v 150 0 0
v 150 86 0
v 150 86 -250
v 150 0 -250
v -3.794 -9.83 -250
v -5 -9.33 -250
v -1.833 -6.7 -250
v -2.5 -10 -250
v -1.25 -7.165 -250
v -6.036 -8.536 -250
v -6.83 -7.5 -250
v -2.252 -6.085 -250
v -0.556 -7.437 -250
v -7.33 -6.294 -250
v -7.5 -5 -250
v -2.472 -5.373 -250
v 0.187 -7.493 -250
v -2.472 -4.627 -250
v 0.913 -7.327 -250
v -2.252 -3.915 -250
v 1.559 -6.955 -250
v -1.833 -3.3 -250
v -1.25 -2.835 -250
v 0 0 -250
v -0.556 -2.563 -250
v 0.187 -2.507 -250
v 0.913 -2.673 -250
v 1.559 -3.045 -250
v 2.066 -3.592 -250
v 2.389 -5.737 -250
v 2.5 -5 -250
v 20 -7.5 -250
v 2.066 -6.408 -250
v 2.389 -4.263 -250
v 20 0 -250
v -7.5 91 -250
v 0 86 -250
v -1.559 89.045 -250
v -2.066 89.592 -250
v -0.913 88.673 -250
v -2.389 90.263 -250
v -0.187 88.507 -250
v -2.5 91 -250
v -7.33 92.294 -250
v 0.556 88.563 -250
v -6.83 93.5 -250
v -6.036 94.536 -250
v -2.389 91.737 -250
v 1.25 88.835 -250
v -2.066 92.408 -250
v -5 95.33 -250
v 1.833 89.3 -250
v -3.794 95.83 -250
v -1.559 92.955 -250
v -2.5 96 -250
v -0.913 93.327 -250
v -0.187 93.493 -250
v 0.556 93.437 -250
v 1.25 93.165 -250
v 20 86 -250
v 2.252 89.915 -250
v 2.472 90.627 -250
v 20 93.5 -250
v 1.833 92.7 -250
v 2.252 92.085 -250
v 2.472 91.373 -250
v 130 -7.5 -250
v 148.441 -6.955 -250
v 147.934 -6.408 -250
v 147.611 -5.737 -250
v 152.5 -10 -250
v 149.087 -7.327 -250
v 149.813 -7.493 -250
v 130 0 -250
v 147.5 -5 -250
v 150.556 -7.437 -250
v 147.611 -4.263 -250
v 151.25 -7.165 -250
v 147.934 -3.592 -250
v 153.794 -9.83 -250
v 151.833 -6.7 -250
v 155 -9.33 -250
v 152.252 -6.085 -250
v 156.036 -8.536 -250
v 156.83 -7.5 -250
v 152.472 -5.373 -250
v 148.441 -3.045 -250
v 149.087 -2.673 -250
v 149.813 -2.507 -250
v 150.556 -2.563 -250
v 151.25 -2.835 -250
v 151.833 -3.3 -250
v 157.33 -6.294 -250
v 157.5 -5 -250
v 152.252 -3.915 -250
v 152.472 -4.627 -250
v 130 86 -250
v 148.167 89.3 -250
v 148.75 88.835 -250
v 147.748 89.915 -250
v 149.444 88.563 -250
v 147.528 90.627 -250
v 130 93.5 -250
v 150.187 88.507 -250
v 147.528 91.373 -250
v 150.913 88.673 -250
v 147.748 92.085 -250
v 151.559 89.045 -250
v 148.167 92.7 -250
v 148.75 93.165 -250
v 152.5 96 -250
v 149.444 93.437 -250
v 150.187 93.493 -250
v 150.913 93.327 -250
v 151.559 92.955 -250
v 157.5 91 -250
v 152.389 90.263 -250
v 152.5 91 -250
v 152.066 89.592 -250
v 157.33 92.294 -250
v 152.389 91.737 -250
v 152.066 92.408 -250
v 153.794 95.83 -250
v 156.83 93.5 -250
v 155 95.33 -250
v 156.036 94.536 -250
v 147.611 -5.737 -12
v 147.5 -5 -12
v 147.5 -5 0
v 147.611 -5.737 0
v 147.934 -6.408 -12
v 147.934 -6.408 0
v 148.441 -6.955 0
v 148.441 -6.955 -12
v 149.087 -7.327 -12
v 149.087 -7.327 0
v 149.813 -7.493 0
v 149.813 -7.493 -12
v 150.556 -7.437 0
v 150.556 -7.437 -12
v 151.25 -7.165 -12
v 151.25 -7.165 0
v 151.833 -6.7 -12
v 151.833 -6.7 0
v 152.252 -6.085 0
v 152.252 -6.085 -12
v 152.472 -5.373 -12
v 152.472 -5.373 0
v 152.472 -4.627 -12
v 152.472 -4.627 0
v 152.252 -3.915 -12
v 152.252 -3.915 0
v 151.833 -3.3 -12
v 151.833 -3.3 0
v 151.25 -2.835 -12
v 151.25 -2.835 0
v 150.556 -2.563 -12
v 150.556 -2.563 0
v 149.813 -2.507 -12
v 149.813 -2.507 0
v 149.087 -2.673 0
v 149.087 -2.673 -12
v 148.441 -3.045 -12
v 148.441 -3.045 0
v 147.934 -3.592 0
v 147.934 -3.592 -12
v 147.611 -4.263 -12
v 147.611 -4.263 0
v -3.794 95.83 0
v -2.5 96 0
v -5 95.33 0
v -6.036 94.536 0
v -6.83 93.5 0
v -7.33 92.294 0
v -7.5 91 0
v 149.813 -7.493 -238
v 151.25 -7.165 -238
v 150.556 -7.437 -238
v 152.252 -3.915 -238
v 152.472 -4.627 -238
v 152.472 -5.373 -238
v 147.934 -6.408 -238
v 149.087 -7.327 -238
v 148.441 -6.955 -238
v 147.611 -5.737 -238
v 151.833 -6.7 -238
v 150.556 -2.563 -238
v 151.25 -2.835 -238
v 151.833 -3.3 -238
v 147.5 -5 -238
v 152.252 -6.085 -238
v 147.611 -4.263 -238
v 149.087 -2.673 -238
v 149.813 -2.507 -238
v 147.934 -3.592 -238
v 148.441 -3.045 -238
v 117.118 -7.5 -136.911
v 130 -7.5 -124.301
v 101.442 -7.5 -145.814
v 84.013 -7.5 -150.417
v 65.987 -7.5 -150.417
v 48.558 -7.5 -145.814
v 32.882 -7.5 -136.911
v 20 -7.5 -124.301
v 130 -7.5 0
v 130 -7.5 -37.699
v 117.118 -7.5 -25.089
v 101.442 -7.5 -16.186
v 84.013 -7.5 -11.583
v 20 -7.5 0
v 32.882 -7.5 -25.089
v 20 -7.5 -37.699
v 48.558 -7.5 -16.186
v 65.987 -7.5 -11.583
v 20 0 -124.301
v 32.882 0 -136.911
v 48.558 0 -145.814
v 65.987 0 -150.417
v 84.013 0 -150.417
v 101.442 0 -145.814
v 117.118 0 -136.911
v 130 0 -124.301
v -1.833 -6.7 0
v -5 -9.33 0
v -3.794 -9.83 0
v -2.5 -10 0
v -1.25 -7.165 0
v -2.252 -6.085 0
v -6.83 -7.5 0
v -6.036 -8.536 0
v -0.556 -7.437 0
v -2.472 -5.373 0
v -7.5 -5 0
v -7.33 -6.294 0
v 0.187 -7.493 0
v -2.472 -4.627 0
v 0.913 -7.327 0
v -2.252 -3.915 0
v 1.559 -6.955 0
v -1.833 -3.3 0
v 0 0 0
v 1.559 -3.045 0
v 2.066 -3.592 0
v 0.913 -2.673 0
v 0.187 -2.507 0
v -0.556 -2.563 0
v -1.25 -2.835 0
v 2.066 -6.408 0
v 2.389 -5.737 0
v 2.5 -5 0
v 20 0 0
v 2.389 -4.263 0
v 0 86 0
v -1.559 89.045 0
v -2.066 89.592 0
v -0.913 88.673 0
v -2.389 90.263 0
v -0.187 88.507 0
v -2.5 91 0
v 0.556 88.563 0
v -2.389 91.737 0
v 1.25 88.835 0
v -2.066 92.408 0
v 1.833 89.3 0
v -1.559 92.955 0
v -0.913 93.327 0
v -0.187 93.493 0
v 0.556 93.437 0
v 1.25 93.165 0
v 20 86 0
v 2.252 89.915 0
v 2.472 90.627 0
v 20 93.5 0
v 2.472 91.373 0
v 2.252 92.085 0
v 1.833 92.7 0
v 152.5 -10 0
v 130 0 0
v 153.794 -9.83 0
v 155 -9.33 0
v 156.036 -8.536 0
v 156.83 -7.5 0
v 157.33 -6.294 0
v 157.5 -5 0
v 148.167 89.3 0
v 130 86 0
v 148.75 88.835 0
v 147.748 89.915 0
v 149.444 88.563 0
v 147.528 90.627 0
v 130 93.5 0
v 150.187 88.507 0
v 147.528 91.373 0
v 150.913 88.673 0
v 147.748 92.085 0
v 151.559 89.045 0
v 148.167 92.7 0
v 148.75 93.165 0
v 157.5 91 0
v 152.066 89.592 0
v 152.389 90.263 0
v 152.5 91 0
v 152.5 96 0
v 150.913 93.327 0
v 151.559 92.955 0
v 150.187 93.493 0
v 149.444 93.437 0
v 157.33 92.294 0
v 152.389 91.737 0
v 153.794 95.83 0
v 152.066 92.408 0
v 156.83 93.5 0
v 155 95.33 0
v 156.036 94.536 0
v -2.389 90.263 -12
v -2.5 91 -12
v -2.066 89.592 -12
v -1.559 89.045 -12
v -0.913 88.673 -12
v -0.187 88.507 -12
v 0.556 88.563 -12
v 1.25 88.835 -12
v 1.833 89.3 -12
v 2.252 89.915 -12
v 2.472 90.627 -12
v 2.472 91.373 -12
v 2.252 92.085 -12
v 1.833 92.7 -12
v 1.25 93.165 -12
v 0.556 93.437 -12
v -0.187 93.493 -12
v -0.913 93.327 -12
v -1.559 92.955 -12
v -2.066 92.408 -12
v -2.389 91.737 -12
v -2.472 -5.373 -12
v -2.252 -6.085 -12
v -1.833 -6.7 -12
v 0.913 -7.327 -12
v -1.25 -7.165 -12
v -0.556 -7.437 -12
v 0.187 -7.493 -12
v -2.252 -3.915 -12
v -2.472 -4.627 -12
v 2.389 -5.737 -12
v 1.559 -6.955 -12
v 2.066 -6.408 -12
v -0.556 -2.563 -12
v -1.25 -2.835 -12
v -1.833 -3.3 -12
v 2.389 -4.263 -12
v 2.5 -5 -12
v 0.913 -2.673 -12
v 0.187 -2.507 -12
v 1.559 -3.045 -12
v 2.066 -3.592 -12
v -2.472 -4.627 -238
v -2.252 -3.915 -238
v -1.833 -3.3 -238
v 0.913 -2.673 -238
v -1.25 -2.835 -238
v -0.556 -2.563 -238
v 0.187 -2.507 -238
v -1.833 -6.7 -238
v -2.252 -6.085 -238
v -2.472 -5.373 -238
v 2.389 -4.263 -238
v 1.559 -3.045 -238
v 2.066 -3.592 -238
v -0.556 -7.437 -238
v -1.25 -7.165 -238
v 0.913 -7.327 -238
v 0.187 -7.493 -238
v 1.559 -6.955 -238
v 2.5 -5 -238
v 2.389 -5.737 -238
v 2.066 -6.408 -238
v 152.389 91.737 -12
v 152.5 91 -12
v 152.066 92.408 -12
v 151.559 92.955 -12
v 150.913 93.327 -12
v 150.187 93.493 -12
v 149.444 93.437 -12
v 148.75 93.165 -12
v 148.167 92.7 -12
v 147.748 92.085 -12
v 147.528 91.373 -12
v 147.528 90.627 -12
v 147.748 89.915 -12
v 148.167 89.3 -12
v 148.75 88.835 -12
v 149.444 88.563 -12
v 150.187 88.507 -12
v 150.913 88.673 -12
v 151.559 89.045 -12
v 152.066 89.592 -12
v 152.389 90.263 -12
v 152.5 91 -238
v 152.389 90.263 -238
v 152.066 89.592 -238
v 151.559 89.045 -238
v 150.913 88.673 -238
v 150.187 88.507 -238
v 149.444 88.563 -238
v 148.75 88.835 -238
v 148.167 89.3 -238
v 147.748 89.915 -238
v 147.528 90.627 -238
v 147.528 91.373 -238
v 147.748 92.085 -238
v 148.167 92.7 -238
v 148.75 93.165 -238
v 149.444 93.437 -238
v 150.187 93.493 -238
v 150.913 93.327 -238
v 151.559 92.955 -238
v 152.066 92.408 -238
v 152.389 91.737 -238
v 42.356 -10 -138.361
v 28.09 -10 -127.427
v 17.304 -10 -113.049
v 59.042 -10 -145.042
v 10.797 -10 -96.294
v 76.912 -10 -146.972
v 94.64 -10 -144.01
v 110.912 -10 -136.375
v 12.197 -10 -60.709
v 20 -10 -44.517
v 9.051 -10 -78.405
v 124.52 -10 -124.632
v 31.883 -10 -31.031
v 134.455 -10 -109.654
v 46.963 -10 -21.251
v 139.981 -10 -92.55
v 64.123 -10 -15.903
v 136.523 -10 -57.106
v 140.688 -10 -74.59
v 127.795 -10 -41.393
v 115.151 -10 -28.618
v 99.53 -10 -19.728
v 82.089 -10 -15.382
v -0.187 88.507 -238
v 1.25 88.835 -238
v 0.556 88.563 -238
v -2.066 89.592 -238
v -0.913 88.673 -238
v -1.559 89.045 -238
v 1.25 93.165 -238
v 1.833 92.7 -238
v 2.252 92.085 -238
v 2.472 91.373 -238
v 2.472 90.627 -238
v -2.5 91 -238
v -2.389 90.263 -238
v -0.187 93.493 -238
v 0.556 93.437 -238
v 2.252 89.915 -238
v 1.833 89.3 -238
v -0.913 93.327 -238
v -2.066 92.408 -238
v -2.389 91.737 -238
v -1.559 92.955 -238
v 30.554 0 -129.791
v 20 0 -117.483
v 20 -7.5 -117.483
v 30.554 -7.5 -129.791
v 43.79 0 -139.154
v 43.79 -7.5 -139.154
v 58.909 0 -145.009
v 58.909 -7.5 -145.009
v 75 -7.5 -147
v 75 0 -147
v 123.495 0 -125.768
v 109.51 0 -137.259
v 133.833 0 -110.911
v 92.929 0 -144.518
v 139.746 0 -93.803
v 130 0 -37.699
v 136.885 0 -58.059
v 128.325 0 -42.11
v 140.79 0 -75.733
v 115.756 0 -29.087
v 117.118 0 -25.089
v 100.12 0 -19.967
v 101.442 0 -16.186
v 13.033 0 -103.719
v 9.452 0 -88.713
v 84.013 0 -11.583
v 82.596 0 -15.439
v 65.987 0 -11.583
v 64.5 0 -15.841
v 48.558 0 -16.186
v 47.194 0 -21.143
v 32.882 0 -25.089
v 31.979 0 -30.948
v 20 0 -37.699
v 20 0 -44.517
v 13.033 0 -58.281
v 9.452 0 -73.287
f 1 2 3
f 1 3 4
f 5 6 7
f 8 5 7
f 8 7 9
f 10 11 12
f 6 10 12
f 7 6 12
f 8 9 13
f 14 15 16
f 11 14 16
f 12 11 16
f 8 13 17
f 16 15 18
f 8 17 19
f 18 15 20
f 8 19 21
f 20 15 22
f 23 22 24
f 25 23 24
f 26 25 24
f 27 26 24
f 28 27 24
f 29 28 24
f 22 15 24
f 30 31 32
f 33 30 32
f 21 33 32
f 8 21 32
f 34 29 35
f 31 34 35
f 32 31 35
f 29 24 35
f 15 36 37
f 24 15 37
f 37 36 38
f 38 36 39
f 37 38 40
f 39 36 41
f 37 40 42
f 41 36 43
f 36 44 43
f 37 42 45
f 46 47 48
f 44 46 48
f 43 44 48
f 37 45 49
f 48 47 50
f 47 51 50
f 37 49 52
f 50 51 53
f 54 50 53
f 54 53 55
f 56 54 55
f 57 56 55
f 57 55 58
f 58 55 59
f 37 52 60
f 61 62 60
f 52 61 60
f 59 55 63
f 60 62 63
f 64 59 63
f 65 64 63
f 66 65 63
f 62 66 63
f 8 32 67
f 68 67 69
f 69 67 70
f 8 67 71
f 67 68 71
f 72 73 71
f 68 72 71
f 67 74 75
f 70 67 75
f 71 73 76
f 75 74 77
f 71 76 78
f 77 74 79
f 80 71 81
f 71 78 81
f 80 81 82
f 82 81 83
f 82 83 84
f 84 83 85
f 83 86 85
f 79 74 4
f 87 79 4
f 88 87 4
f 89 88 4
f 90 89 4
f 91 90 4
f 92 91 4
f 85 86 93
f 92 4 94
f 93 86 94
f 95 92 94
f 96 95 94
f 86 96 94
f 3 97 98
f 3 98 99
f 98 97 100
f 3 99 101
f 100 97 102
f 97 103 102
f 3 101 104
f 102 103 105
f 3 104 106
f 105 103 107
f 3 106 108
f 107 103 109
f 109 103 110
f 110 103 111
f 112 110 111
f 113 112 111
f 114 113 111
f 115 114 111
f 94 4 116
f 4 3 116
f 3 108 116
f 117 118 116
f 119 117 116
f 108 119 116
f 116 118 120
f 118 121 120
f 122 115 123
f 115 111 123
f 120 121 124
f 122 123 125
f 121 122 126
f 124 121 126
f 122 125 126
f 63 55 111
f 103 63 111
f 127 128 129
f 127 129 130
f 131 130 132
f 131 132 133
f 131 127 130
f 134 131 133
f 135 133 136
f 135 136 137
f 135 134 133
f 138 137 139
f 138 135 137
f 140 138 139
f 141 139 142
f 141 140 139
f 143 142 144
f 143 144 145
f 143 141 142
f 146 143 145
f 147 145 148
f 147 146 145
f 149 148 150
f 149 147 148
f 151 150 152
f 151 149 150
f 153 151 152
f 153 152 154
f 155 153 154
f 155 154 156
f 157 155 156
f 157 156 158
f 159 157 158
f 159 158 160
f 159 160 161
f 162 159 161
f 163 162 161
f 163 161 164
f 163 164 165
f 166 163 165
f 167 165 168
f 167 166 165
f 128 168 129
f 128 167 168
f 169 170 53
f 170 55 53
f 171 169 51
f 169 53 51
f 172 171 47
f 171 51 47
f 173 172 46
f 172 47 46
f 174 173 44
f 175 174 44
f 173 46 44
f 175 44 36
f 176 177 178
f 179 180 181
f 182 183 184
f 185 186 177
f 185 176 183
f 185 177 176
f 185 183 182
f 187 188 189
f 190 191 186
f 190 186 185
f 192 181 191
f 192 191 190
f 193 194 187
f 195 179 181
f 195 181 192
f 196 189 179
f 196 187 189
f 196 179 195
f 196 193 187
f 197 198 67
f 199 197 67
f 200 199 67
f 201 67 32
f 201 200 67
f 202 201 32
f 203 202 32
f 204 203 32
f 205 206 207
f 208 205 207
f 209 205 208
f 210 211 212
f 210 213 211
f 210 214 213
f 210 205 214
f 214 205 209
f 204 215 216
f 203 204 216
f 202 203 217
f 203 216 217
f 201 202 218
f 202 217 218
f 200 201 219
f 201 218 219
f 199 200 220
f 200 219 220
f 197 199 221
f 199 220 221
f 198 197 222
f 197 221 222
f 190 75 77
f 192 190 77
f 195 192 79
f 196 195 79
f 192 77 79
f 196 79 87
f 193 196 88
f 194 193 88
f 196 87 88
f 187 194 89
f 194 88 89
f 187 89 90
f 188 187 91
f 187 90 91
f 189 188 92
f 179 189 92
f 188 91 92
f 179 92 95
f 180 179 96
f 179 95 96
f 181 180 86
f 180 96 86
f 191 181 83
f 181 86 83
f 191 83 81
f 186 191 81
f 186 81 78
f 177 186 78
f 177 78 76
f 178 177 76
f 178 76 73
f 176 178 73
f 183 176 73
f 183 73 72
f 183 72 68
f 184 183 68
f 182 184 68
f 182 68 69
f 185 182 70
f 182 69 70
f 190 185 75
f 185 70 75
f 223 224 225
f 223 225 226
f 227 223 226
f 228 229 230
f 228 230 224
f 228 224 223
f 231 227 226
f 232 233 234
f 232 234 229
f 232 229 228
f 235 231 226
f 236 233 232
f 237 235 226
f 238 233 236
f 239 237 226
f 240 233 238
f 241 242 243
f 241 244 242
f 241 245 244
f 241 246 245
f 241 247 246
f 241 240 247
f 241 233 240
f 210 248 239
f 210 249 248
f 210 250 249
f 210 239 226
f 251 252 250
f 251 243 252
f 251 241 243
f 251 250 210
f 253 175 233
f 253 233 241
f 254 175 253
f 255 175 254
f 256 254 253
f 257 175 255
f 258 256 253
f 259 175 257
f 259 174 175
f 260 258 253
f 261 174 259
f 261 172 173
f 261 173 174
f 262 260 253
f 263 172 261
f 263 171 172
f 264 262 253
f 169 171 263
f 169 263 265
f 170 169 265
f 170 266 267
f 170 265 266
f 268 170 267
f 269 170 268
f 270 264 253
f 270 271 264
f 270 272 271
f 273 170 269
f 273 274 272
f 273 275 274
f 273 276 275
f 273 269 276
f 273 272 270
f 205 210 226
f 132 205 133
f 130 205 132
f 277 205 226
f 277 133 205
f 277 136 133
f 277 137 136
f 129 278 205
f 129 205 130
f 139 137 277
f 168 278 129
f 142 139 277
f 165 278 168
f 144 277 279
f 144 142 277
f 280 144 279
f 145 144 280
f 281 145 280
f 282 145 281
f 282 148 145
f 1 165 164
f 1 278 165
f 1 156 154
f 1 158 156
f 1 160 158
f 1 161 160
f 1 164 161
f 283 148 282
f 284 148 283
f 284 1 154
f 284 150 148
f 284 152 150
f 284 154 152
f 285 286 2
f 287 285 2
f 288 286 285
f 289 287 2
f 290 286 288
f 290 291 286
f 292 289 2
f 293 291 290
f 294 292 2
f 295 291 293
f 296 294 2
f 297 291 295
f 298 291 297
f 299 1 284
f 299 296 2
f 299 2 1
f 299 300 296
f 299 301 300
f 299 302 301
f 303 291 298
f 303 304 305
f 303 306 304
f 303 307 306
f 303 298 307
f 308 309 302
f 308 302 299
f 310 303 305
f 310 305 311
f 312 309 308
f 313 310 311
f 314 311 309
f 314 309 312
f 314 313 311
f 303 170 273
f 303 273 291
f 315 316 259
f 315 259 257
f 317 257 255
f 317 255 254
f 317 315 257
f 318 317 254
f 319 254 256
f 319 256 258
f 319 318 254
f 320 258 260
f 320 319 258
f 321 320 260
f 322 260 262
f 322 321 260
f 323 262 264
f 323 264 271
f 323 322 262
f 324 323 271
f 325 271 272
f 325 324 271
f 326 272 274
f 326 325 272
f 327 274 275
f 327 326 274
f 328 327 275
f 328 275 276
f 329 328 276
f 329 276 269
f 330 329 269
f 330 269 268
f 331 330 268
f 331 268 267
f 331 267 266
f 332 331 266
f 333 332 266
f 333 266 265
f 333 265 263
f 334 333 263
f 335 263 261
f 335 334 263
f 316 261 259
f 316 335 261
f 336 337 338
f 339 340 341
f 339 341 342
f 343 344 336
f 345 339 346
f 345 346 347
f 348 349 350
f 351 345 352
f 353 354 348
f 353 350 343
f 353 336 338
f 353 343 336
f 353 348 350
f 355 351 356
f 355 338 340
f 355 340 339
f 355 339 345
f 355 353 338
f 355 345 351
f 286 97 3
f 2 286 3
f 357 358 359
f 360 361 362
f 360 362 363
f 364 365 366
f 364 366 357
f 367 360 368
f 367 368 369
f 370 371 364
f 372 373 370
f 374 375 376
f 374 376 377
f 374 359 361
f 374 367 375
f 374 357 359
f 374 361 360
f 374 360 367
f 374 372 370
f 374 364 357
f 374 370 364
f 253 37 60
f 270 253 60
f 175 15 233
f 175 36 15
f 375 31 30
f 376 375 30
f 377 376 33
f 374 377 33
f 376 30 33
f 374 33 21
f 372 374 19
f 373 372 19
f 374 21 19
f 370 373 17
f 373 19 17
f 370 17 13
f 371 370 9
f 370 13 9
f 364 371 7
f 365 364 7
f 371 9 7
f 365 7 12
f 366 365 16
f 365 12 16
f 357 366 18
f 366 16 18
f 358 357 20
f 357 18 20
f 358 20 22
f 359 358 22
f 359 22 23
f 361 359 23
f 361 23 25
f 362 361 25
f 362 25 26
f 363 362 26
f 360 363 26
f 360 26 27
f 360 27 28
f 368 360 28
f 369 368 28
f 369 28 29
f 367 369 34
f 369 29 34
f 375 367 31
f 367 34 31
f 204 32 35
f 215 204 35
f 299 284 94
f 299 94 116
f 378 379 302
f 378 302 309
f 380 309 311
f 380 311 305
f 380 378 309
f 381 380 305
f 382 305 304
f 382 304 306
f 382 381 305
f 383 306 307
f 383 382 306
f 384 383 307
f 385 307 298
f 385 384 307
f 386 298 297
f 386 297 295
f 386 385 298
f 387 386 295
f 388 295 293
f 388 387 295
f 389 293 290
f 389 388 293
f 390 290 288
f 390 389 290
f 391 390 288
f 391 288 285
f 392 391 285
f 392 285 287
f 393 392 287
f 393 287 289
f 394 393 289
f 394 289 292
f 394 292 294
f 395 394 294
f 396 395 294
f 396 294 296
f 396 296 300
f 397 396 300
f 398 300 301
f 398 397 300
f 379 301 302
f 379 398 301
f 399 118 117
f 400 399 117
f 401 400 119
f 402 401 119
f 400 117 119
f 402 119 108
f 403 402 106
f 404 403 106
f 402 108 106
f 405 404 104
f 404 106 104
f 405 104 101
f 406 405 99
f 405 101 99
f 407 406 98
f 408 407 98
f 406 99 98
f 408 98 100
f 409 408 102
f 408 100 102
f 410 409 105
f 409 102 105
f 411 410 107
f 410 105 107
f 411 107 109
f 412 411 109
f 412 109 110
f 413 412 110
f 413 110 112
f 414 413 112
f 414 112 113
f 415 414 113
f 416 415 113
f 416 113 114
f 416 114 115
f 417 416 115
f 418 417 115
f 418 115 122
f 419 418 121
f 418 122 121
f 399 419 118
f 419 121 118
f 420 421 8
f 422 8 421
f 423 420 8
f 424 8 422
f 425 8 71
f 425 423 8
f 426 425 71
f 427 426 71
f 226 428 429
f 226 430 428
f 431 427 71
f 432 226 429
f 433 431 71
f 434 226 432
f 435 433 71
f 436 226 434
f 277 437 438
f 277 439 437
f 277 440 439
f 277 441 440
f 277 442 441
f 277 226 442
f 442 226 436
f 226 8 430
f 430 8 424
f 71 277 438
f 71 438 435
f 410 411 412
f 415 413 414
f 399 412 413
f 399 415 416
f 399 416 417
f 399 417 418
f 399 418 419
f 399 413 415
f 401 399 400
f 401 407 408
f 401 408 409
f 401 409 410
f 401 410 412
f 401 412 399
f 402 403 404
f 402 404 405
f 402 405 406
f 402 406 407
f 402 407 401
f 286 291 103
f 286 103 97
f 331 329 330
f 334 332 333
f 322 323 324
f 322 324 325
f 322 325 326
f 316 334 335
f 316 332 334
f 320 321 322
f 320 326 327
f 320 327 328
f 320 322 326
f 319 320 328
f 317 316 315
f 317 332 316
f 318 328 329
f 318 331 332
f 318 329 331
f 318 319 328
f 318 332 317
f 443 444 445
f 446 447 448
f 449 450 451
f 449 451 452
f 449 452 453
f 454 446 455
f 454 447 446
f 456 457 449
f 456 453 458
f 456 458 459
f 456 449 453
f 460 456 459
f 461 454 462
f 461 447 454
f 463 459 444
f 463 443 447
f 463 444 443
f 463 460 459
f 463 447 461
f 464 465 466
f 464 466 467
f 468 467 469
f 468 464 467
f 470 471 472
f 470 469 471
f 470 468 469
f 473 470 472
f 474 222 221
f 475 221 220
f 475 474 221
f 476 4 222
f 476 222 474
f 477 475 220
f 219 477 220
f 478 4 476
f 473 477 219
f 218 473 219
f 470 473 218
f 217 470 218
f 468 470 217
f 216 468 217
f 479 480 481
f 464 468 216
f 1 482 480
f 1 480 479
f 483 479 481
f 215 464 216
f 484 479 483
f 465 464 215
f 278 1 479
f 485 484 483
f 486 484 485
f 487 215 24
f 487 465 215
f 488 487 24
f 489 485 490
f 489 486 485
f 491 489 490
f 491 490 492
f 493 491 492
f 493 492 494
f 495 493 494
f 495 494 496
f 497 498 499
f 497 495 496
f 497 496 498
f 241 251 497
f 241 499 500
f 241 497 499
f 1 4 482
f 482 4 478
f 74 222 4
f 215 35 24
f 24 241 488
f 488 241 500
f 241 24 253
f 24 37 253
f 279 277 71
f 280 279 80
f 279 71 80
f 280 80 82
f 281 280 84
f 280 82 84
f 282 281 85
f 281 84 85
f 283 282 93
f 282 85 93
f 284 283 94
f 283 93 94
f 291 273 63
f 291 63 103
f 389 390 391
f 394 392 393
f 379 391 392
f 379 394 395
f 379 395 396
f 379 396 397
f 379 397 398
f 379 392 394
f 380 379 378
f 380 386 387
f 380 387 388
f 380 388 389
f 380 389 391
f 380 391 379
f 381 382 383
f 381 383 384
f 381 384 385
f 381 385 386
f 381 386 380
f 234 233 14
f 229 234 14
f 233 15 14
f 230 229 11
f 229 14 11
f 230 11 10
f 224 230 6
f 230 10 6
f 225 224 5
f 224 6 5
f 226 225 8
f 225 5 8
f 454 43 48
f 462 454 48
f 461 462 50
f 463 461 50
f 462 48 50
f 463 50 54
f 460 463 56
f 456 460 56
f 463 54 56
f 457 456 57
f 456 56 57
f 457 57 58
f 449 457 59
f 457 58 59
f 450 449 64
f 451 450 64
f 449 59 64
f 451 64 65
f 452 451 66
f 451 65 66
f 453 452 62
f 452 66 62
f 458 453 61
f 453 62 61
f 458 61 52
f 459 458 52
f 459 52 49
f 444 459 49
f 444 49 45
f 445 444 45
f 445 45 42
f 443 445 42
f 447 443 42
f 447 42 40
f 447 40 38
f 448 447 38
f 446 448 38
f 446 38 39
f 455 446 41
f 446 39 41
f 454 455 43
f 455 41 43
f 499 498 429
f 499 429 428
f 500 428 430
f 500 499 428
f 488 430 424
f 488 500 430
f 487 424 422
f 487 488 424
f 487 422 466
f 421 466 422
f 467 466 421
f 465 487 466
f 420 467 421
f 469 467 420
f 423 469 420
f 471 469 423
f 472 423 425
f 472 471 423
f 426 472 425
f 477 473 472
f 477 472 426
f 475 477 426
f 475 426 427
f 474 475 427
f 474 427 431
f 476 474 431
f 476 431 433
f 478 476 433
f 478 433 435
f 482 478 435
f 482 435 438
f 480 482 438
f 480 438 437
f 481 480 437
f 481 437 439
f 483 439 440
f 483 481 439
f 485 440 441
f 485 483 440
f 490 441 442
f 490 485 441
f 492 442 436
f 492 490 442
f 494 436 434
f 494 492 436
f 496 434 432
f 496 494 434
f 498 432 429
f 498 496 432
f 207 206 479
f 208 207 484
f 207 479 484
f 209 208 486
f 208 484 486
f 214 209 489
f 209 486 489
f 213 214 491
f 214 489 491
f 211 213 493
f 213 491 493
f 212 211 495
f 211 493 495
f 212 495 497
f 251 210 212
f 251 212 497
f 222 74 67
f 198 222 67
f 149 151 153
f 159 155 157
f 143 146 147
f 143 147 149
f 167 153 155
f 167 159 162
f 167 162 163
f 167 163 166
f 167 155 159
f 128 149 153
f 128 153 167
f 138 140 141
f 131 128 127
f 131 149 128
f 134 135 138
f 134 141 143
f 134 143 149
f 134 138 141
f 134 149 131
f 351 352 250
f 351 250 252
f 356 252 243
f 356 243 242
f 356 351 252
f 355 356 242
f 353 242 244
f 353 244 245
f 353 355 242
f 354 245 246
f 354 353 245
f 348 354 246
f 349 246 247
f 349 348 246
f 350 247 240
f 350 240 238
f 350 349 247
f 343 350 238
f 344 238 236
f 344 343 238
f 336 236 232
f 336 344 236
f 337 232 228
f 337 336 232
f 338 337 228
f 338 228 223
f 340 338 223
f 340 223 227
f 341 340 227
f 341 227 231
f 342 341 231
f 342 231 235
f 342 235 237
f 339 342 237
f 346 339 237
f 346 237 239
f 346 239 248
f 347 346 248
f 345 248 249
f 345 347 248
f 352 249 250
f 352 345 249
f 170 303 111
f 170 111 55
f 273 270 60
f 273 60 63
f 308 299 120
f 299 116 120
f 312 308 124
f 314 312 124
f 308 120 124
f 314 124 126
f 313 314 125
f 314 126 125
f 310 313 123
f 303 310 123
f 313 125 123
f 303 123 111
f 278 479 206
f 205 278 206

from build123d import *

# Parameters (mm, degrees)
BOSS_EXTRUDE3_DEPTH   = 250
BOSS_EXTRUDE3_2_DEPTH = 250
FILLET1_R             = 5
FILLET2_R             = 5
SKETCH7_R             = 66
CUT_EXTRUDE1_DEPTH    = 10
SKETCH9_R             = 70
SKETCH9_R_2           = 66
BOSS_EXTRUDE4_DEPTH   = 8
SKETCH14_R            = 2.5
CUT_EXTRUDE2_DEPTH    = 12
CUT_EXTRUDE3_START    = -12
SKETCH15_R            = 2.5
CUT_EXTRUDE3_DEPTH    = 12
SKETCH17_W            = 7.5
SKETCH17_H            = 250
BOSS_EXTRUDE5_DEPTH   = 46


with BuildPart() as part:
    # Sketch4 → Boss-Extrude3 (new body)
    with BuildSketch(Plane.XY):
        Polygon((130, 93.5), (130, 86), (150, 86), (150, 66), (155, 66), (157.5, 66), (157.5, 96), (-7.5, 96), (-7.5, 66), (-5, 66), (0, 66), (0, 86), (20, 86), (20, 93.5), align=None)
    extrude(amount=-BOSS_EXTRUDE3_DEPTH)

    # Fillet1
    fillet1_edges = [part.edges().sort_by_distance(p)[0] for p in [
        (-7.5, 96, -125),
        (157.5, 96, -125),
    ]]
    fillet(fillet1_edges, radius=FILLET1_R)


with BuildPart() as body_2:
    # Sketch4 → Boss-Extrude3 2 (new body)
    with BuildSketch(Plane.XY):
        Polygon((155, 20), (150, 20), (150, 0), (130, 0), (130, -7.5), (20, -7.5), (20, 0), (0, 0), (0, 20), (-5, 20), (-7.5, 20), (-7.5, 0), (-7.5, -10), (157.5, -10), (157.5, 20), align=None)
    extrude(amount=-BOSS_EXTRUDE3_2_DEPTH)

    # Fillet2
    fillet2_edges = [body_2.edges().sort_by_distance(p)[0] for p in [
        (157.5, -10, -125),
        (-7.5, -10, -125),
    ]]
    fillet(fillet2_edges, radius=FILLET2_R)

    # Sketch7 → Cut-Extrude1 (cut)
    with BuildSketch(Plane(origin=(0, 0, 0), x_dir=(-1, 0, 0), z_dir=(0, -1, 0))):
        with Locations(Location((-75, 81, 0), (0, 0, 326.442690238))):
            Circle(SKETCH7_R)
    extrude(amount=CUT_EXTRUDE1_DEPTH, mode=Mode.SUBTRACT)

    # Sketch9 → Boss-Extrude4 (add)
    with BuildSketch(Plane.XZ):
        with Locations((75, -81)):
            Circle(SKETCH9_R)
        with Locations(Location((75, -81, 0), (0, 0, 270))):
            Circle(SKETCH9_R_2, mode=Mode.SUBTRACT)
    extrude(amount=BOSS_EXTRUDE4_DEPTH)


with BuildPart() as cut_extrude2_tool:
    # Sketch14 → Cut-Extrude2 (new body)
    with BuildSketch(Plane(origin=(0, 0, -250), x_dir=(-1, 0, 0), z_dir=(0, 0, -1))):
        with Locations((0, 91)):
            Circle(SKETCH14_R)
        with Locations(Location((-150, 91, 0), (0, 0, 180))):
            Circle(SKETCH14_R)
        with Locations(Location((0, -5, 0), (0, 0, 180))):
            Circle(SKETCH14_R)
        with Locations((-150, -5)):
            Circle(SKETCH14_R)
    extrude(amount=-CUT_EXTRUDE2_DEPTH)


with BuildPart() as part_1:
    add(part.part)

    # Cut-Extrude2: cut by cut_extrude2_tool
    add(cut_extrude2_tool.part, mode=Mode.SUBTRACT)


with BuildPart() as body_2_1:
    add(body_2.part)

    # Cut-Extrude2: cut by cut_extrude2_tool
    add(cut_extrude2_tool.part, mode=Mode.SUBTRACT)


with BuildPart() as cut_extrude3_tool:
    # Sketch15 → Cut-Extrude3 (new body)
    with BuildSketch(Plane.XY.offset(CUT_EXTRUDE3_START)):
        with Locations(Location((0, 91, 0), (0, 0, 180))):
            Circle(SKETCH15_R)
        with Locations((150, 91)):
            Circle(SKETCH15_R)
        with Locations(Location((150, -5, 0), (0, 0, 180))):
            Circle(SKETCH15_R)
        with Locations((0, -5)):
            Circle(SKETCH15_R)
    extrude(amount=CUT_EXTRUDE3_DEPTH)


with BuildPart() as part_2:
    add(part_1.part)

    # Cut-Extrude3: cut by cut_extrude3_tool
    add(cut_extrude3_tool.part, mode=Mode.SUBTRACT)



with BuildPart() as body_2_2:
    add(body_2_1.part)

    # Cut-Extrude3: cut by cut_extrude3_tool
    add(cut_extrude3_tool.part, mode=Mode.SUBTRACT)


with BuildPart() as part_3:
    add(part_2.part)

    add(body_2_2.part)  # Boss-Extrude5 merges body 2
    # Sketch17 → Boss-Extrude5 (add)
    with BuildSketch(Plane.XZ.offset(-66)):
        with Locations((-3.75, -125)):
            Rectangle(SKETCH17_W, SKETCH17_H)
        with Locations((153.75, -125)):
            Rectangle(SKETCH17_W, SKETCH17_H)
    extrude(amount=BOSS_EXTRUDE5_DEPTH)


solid = part_3.part
